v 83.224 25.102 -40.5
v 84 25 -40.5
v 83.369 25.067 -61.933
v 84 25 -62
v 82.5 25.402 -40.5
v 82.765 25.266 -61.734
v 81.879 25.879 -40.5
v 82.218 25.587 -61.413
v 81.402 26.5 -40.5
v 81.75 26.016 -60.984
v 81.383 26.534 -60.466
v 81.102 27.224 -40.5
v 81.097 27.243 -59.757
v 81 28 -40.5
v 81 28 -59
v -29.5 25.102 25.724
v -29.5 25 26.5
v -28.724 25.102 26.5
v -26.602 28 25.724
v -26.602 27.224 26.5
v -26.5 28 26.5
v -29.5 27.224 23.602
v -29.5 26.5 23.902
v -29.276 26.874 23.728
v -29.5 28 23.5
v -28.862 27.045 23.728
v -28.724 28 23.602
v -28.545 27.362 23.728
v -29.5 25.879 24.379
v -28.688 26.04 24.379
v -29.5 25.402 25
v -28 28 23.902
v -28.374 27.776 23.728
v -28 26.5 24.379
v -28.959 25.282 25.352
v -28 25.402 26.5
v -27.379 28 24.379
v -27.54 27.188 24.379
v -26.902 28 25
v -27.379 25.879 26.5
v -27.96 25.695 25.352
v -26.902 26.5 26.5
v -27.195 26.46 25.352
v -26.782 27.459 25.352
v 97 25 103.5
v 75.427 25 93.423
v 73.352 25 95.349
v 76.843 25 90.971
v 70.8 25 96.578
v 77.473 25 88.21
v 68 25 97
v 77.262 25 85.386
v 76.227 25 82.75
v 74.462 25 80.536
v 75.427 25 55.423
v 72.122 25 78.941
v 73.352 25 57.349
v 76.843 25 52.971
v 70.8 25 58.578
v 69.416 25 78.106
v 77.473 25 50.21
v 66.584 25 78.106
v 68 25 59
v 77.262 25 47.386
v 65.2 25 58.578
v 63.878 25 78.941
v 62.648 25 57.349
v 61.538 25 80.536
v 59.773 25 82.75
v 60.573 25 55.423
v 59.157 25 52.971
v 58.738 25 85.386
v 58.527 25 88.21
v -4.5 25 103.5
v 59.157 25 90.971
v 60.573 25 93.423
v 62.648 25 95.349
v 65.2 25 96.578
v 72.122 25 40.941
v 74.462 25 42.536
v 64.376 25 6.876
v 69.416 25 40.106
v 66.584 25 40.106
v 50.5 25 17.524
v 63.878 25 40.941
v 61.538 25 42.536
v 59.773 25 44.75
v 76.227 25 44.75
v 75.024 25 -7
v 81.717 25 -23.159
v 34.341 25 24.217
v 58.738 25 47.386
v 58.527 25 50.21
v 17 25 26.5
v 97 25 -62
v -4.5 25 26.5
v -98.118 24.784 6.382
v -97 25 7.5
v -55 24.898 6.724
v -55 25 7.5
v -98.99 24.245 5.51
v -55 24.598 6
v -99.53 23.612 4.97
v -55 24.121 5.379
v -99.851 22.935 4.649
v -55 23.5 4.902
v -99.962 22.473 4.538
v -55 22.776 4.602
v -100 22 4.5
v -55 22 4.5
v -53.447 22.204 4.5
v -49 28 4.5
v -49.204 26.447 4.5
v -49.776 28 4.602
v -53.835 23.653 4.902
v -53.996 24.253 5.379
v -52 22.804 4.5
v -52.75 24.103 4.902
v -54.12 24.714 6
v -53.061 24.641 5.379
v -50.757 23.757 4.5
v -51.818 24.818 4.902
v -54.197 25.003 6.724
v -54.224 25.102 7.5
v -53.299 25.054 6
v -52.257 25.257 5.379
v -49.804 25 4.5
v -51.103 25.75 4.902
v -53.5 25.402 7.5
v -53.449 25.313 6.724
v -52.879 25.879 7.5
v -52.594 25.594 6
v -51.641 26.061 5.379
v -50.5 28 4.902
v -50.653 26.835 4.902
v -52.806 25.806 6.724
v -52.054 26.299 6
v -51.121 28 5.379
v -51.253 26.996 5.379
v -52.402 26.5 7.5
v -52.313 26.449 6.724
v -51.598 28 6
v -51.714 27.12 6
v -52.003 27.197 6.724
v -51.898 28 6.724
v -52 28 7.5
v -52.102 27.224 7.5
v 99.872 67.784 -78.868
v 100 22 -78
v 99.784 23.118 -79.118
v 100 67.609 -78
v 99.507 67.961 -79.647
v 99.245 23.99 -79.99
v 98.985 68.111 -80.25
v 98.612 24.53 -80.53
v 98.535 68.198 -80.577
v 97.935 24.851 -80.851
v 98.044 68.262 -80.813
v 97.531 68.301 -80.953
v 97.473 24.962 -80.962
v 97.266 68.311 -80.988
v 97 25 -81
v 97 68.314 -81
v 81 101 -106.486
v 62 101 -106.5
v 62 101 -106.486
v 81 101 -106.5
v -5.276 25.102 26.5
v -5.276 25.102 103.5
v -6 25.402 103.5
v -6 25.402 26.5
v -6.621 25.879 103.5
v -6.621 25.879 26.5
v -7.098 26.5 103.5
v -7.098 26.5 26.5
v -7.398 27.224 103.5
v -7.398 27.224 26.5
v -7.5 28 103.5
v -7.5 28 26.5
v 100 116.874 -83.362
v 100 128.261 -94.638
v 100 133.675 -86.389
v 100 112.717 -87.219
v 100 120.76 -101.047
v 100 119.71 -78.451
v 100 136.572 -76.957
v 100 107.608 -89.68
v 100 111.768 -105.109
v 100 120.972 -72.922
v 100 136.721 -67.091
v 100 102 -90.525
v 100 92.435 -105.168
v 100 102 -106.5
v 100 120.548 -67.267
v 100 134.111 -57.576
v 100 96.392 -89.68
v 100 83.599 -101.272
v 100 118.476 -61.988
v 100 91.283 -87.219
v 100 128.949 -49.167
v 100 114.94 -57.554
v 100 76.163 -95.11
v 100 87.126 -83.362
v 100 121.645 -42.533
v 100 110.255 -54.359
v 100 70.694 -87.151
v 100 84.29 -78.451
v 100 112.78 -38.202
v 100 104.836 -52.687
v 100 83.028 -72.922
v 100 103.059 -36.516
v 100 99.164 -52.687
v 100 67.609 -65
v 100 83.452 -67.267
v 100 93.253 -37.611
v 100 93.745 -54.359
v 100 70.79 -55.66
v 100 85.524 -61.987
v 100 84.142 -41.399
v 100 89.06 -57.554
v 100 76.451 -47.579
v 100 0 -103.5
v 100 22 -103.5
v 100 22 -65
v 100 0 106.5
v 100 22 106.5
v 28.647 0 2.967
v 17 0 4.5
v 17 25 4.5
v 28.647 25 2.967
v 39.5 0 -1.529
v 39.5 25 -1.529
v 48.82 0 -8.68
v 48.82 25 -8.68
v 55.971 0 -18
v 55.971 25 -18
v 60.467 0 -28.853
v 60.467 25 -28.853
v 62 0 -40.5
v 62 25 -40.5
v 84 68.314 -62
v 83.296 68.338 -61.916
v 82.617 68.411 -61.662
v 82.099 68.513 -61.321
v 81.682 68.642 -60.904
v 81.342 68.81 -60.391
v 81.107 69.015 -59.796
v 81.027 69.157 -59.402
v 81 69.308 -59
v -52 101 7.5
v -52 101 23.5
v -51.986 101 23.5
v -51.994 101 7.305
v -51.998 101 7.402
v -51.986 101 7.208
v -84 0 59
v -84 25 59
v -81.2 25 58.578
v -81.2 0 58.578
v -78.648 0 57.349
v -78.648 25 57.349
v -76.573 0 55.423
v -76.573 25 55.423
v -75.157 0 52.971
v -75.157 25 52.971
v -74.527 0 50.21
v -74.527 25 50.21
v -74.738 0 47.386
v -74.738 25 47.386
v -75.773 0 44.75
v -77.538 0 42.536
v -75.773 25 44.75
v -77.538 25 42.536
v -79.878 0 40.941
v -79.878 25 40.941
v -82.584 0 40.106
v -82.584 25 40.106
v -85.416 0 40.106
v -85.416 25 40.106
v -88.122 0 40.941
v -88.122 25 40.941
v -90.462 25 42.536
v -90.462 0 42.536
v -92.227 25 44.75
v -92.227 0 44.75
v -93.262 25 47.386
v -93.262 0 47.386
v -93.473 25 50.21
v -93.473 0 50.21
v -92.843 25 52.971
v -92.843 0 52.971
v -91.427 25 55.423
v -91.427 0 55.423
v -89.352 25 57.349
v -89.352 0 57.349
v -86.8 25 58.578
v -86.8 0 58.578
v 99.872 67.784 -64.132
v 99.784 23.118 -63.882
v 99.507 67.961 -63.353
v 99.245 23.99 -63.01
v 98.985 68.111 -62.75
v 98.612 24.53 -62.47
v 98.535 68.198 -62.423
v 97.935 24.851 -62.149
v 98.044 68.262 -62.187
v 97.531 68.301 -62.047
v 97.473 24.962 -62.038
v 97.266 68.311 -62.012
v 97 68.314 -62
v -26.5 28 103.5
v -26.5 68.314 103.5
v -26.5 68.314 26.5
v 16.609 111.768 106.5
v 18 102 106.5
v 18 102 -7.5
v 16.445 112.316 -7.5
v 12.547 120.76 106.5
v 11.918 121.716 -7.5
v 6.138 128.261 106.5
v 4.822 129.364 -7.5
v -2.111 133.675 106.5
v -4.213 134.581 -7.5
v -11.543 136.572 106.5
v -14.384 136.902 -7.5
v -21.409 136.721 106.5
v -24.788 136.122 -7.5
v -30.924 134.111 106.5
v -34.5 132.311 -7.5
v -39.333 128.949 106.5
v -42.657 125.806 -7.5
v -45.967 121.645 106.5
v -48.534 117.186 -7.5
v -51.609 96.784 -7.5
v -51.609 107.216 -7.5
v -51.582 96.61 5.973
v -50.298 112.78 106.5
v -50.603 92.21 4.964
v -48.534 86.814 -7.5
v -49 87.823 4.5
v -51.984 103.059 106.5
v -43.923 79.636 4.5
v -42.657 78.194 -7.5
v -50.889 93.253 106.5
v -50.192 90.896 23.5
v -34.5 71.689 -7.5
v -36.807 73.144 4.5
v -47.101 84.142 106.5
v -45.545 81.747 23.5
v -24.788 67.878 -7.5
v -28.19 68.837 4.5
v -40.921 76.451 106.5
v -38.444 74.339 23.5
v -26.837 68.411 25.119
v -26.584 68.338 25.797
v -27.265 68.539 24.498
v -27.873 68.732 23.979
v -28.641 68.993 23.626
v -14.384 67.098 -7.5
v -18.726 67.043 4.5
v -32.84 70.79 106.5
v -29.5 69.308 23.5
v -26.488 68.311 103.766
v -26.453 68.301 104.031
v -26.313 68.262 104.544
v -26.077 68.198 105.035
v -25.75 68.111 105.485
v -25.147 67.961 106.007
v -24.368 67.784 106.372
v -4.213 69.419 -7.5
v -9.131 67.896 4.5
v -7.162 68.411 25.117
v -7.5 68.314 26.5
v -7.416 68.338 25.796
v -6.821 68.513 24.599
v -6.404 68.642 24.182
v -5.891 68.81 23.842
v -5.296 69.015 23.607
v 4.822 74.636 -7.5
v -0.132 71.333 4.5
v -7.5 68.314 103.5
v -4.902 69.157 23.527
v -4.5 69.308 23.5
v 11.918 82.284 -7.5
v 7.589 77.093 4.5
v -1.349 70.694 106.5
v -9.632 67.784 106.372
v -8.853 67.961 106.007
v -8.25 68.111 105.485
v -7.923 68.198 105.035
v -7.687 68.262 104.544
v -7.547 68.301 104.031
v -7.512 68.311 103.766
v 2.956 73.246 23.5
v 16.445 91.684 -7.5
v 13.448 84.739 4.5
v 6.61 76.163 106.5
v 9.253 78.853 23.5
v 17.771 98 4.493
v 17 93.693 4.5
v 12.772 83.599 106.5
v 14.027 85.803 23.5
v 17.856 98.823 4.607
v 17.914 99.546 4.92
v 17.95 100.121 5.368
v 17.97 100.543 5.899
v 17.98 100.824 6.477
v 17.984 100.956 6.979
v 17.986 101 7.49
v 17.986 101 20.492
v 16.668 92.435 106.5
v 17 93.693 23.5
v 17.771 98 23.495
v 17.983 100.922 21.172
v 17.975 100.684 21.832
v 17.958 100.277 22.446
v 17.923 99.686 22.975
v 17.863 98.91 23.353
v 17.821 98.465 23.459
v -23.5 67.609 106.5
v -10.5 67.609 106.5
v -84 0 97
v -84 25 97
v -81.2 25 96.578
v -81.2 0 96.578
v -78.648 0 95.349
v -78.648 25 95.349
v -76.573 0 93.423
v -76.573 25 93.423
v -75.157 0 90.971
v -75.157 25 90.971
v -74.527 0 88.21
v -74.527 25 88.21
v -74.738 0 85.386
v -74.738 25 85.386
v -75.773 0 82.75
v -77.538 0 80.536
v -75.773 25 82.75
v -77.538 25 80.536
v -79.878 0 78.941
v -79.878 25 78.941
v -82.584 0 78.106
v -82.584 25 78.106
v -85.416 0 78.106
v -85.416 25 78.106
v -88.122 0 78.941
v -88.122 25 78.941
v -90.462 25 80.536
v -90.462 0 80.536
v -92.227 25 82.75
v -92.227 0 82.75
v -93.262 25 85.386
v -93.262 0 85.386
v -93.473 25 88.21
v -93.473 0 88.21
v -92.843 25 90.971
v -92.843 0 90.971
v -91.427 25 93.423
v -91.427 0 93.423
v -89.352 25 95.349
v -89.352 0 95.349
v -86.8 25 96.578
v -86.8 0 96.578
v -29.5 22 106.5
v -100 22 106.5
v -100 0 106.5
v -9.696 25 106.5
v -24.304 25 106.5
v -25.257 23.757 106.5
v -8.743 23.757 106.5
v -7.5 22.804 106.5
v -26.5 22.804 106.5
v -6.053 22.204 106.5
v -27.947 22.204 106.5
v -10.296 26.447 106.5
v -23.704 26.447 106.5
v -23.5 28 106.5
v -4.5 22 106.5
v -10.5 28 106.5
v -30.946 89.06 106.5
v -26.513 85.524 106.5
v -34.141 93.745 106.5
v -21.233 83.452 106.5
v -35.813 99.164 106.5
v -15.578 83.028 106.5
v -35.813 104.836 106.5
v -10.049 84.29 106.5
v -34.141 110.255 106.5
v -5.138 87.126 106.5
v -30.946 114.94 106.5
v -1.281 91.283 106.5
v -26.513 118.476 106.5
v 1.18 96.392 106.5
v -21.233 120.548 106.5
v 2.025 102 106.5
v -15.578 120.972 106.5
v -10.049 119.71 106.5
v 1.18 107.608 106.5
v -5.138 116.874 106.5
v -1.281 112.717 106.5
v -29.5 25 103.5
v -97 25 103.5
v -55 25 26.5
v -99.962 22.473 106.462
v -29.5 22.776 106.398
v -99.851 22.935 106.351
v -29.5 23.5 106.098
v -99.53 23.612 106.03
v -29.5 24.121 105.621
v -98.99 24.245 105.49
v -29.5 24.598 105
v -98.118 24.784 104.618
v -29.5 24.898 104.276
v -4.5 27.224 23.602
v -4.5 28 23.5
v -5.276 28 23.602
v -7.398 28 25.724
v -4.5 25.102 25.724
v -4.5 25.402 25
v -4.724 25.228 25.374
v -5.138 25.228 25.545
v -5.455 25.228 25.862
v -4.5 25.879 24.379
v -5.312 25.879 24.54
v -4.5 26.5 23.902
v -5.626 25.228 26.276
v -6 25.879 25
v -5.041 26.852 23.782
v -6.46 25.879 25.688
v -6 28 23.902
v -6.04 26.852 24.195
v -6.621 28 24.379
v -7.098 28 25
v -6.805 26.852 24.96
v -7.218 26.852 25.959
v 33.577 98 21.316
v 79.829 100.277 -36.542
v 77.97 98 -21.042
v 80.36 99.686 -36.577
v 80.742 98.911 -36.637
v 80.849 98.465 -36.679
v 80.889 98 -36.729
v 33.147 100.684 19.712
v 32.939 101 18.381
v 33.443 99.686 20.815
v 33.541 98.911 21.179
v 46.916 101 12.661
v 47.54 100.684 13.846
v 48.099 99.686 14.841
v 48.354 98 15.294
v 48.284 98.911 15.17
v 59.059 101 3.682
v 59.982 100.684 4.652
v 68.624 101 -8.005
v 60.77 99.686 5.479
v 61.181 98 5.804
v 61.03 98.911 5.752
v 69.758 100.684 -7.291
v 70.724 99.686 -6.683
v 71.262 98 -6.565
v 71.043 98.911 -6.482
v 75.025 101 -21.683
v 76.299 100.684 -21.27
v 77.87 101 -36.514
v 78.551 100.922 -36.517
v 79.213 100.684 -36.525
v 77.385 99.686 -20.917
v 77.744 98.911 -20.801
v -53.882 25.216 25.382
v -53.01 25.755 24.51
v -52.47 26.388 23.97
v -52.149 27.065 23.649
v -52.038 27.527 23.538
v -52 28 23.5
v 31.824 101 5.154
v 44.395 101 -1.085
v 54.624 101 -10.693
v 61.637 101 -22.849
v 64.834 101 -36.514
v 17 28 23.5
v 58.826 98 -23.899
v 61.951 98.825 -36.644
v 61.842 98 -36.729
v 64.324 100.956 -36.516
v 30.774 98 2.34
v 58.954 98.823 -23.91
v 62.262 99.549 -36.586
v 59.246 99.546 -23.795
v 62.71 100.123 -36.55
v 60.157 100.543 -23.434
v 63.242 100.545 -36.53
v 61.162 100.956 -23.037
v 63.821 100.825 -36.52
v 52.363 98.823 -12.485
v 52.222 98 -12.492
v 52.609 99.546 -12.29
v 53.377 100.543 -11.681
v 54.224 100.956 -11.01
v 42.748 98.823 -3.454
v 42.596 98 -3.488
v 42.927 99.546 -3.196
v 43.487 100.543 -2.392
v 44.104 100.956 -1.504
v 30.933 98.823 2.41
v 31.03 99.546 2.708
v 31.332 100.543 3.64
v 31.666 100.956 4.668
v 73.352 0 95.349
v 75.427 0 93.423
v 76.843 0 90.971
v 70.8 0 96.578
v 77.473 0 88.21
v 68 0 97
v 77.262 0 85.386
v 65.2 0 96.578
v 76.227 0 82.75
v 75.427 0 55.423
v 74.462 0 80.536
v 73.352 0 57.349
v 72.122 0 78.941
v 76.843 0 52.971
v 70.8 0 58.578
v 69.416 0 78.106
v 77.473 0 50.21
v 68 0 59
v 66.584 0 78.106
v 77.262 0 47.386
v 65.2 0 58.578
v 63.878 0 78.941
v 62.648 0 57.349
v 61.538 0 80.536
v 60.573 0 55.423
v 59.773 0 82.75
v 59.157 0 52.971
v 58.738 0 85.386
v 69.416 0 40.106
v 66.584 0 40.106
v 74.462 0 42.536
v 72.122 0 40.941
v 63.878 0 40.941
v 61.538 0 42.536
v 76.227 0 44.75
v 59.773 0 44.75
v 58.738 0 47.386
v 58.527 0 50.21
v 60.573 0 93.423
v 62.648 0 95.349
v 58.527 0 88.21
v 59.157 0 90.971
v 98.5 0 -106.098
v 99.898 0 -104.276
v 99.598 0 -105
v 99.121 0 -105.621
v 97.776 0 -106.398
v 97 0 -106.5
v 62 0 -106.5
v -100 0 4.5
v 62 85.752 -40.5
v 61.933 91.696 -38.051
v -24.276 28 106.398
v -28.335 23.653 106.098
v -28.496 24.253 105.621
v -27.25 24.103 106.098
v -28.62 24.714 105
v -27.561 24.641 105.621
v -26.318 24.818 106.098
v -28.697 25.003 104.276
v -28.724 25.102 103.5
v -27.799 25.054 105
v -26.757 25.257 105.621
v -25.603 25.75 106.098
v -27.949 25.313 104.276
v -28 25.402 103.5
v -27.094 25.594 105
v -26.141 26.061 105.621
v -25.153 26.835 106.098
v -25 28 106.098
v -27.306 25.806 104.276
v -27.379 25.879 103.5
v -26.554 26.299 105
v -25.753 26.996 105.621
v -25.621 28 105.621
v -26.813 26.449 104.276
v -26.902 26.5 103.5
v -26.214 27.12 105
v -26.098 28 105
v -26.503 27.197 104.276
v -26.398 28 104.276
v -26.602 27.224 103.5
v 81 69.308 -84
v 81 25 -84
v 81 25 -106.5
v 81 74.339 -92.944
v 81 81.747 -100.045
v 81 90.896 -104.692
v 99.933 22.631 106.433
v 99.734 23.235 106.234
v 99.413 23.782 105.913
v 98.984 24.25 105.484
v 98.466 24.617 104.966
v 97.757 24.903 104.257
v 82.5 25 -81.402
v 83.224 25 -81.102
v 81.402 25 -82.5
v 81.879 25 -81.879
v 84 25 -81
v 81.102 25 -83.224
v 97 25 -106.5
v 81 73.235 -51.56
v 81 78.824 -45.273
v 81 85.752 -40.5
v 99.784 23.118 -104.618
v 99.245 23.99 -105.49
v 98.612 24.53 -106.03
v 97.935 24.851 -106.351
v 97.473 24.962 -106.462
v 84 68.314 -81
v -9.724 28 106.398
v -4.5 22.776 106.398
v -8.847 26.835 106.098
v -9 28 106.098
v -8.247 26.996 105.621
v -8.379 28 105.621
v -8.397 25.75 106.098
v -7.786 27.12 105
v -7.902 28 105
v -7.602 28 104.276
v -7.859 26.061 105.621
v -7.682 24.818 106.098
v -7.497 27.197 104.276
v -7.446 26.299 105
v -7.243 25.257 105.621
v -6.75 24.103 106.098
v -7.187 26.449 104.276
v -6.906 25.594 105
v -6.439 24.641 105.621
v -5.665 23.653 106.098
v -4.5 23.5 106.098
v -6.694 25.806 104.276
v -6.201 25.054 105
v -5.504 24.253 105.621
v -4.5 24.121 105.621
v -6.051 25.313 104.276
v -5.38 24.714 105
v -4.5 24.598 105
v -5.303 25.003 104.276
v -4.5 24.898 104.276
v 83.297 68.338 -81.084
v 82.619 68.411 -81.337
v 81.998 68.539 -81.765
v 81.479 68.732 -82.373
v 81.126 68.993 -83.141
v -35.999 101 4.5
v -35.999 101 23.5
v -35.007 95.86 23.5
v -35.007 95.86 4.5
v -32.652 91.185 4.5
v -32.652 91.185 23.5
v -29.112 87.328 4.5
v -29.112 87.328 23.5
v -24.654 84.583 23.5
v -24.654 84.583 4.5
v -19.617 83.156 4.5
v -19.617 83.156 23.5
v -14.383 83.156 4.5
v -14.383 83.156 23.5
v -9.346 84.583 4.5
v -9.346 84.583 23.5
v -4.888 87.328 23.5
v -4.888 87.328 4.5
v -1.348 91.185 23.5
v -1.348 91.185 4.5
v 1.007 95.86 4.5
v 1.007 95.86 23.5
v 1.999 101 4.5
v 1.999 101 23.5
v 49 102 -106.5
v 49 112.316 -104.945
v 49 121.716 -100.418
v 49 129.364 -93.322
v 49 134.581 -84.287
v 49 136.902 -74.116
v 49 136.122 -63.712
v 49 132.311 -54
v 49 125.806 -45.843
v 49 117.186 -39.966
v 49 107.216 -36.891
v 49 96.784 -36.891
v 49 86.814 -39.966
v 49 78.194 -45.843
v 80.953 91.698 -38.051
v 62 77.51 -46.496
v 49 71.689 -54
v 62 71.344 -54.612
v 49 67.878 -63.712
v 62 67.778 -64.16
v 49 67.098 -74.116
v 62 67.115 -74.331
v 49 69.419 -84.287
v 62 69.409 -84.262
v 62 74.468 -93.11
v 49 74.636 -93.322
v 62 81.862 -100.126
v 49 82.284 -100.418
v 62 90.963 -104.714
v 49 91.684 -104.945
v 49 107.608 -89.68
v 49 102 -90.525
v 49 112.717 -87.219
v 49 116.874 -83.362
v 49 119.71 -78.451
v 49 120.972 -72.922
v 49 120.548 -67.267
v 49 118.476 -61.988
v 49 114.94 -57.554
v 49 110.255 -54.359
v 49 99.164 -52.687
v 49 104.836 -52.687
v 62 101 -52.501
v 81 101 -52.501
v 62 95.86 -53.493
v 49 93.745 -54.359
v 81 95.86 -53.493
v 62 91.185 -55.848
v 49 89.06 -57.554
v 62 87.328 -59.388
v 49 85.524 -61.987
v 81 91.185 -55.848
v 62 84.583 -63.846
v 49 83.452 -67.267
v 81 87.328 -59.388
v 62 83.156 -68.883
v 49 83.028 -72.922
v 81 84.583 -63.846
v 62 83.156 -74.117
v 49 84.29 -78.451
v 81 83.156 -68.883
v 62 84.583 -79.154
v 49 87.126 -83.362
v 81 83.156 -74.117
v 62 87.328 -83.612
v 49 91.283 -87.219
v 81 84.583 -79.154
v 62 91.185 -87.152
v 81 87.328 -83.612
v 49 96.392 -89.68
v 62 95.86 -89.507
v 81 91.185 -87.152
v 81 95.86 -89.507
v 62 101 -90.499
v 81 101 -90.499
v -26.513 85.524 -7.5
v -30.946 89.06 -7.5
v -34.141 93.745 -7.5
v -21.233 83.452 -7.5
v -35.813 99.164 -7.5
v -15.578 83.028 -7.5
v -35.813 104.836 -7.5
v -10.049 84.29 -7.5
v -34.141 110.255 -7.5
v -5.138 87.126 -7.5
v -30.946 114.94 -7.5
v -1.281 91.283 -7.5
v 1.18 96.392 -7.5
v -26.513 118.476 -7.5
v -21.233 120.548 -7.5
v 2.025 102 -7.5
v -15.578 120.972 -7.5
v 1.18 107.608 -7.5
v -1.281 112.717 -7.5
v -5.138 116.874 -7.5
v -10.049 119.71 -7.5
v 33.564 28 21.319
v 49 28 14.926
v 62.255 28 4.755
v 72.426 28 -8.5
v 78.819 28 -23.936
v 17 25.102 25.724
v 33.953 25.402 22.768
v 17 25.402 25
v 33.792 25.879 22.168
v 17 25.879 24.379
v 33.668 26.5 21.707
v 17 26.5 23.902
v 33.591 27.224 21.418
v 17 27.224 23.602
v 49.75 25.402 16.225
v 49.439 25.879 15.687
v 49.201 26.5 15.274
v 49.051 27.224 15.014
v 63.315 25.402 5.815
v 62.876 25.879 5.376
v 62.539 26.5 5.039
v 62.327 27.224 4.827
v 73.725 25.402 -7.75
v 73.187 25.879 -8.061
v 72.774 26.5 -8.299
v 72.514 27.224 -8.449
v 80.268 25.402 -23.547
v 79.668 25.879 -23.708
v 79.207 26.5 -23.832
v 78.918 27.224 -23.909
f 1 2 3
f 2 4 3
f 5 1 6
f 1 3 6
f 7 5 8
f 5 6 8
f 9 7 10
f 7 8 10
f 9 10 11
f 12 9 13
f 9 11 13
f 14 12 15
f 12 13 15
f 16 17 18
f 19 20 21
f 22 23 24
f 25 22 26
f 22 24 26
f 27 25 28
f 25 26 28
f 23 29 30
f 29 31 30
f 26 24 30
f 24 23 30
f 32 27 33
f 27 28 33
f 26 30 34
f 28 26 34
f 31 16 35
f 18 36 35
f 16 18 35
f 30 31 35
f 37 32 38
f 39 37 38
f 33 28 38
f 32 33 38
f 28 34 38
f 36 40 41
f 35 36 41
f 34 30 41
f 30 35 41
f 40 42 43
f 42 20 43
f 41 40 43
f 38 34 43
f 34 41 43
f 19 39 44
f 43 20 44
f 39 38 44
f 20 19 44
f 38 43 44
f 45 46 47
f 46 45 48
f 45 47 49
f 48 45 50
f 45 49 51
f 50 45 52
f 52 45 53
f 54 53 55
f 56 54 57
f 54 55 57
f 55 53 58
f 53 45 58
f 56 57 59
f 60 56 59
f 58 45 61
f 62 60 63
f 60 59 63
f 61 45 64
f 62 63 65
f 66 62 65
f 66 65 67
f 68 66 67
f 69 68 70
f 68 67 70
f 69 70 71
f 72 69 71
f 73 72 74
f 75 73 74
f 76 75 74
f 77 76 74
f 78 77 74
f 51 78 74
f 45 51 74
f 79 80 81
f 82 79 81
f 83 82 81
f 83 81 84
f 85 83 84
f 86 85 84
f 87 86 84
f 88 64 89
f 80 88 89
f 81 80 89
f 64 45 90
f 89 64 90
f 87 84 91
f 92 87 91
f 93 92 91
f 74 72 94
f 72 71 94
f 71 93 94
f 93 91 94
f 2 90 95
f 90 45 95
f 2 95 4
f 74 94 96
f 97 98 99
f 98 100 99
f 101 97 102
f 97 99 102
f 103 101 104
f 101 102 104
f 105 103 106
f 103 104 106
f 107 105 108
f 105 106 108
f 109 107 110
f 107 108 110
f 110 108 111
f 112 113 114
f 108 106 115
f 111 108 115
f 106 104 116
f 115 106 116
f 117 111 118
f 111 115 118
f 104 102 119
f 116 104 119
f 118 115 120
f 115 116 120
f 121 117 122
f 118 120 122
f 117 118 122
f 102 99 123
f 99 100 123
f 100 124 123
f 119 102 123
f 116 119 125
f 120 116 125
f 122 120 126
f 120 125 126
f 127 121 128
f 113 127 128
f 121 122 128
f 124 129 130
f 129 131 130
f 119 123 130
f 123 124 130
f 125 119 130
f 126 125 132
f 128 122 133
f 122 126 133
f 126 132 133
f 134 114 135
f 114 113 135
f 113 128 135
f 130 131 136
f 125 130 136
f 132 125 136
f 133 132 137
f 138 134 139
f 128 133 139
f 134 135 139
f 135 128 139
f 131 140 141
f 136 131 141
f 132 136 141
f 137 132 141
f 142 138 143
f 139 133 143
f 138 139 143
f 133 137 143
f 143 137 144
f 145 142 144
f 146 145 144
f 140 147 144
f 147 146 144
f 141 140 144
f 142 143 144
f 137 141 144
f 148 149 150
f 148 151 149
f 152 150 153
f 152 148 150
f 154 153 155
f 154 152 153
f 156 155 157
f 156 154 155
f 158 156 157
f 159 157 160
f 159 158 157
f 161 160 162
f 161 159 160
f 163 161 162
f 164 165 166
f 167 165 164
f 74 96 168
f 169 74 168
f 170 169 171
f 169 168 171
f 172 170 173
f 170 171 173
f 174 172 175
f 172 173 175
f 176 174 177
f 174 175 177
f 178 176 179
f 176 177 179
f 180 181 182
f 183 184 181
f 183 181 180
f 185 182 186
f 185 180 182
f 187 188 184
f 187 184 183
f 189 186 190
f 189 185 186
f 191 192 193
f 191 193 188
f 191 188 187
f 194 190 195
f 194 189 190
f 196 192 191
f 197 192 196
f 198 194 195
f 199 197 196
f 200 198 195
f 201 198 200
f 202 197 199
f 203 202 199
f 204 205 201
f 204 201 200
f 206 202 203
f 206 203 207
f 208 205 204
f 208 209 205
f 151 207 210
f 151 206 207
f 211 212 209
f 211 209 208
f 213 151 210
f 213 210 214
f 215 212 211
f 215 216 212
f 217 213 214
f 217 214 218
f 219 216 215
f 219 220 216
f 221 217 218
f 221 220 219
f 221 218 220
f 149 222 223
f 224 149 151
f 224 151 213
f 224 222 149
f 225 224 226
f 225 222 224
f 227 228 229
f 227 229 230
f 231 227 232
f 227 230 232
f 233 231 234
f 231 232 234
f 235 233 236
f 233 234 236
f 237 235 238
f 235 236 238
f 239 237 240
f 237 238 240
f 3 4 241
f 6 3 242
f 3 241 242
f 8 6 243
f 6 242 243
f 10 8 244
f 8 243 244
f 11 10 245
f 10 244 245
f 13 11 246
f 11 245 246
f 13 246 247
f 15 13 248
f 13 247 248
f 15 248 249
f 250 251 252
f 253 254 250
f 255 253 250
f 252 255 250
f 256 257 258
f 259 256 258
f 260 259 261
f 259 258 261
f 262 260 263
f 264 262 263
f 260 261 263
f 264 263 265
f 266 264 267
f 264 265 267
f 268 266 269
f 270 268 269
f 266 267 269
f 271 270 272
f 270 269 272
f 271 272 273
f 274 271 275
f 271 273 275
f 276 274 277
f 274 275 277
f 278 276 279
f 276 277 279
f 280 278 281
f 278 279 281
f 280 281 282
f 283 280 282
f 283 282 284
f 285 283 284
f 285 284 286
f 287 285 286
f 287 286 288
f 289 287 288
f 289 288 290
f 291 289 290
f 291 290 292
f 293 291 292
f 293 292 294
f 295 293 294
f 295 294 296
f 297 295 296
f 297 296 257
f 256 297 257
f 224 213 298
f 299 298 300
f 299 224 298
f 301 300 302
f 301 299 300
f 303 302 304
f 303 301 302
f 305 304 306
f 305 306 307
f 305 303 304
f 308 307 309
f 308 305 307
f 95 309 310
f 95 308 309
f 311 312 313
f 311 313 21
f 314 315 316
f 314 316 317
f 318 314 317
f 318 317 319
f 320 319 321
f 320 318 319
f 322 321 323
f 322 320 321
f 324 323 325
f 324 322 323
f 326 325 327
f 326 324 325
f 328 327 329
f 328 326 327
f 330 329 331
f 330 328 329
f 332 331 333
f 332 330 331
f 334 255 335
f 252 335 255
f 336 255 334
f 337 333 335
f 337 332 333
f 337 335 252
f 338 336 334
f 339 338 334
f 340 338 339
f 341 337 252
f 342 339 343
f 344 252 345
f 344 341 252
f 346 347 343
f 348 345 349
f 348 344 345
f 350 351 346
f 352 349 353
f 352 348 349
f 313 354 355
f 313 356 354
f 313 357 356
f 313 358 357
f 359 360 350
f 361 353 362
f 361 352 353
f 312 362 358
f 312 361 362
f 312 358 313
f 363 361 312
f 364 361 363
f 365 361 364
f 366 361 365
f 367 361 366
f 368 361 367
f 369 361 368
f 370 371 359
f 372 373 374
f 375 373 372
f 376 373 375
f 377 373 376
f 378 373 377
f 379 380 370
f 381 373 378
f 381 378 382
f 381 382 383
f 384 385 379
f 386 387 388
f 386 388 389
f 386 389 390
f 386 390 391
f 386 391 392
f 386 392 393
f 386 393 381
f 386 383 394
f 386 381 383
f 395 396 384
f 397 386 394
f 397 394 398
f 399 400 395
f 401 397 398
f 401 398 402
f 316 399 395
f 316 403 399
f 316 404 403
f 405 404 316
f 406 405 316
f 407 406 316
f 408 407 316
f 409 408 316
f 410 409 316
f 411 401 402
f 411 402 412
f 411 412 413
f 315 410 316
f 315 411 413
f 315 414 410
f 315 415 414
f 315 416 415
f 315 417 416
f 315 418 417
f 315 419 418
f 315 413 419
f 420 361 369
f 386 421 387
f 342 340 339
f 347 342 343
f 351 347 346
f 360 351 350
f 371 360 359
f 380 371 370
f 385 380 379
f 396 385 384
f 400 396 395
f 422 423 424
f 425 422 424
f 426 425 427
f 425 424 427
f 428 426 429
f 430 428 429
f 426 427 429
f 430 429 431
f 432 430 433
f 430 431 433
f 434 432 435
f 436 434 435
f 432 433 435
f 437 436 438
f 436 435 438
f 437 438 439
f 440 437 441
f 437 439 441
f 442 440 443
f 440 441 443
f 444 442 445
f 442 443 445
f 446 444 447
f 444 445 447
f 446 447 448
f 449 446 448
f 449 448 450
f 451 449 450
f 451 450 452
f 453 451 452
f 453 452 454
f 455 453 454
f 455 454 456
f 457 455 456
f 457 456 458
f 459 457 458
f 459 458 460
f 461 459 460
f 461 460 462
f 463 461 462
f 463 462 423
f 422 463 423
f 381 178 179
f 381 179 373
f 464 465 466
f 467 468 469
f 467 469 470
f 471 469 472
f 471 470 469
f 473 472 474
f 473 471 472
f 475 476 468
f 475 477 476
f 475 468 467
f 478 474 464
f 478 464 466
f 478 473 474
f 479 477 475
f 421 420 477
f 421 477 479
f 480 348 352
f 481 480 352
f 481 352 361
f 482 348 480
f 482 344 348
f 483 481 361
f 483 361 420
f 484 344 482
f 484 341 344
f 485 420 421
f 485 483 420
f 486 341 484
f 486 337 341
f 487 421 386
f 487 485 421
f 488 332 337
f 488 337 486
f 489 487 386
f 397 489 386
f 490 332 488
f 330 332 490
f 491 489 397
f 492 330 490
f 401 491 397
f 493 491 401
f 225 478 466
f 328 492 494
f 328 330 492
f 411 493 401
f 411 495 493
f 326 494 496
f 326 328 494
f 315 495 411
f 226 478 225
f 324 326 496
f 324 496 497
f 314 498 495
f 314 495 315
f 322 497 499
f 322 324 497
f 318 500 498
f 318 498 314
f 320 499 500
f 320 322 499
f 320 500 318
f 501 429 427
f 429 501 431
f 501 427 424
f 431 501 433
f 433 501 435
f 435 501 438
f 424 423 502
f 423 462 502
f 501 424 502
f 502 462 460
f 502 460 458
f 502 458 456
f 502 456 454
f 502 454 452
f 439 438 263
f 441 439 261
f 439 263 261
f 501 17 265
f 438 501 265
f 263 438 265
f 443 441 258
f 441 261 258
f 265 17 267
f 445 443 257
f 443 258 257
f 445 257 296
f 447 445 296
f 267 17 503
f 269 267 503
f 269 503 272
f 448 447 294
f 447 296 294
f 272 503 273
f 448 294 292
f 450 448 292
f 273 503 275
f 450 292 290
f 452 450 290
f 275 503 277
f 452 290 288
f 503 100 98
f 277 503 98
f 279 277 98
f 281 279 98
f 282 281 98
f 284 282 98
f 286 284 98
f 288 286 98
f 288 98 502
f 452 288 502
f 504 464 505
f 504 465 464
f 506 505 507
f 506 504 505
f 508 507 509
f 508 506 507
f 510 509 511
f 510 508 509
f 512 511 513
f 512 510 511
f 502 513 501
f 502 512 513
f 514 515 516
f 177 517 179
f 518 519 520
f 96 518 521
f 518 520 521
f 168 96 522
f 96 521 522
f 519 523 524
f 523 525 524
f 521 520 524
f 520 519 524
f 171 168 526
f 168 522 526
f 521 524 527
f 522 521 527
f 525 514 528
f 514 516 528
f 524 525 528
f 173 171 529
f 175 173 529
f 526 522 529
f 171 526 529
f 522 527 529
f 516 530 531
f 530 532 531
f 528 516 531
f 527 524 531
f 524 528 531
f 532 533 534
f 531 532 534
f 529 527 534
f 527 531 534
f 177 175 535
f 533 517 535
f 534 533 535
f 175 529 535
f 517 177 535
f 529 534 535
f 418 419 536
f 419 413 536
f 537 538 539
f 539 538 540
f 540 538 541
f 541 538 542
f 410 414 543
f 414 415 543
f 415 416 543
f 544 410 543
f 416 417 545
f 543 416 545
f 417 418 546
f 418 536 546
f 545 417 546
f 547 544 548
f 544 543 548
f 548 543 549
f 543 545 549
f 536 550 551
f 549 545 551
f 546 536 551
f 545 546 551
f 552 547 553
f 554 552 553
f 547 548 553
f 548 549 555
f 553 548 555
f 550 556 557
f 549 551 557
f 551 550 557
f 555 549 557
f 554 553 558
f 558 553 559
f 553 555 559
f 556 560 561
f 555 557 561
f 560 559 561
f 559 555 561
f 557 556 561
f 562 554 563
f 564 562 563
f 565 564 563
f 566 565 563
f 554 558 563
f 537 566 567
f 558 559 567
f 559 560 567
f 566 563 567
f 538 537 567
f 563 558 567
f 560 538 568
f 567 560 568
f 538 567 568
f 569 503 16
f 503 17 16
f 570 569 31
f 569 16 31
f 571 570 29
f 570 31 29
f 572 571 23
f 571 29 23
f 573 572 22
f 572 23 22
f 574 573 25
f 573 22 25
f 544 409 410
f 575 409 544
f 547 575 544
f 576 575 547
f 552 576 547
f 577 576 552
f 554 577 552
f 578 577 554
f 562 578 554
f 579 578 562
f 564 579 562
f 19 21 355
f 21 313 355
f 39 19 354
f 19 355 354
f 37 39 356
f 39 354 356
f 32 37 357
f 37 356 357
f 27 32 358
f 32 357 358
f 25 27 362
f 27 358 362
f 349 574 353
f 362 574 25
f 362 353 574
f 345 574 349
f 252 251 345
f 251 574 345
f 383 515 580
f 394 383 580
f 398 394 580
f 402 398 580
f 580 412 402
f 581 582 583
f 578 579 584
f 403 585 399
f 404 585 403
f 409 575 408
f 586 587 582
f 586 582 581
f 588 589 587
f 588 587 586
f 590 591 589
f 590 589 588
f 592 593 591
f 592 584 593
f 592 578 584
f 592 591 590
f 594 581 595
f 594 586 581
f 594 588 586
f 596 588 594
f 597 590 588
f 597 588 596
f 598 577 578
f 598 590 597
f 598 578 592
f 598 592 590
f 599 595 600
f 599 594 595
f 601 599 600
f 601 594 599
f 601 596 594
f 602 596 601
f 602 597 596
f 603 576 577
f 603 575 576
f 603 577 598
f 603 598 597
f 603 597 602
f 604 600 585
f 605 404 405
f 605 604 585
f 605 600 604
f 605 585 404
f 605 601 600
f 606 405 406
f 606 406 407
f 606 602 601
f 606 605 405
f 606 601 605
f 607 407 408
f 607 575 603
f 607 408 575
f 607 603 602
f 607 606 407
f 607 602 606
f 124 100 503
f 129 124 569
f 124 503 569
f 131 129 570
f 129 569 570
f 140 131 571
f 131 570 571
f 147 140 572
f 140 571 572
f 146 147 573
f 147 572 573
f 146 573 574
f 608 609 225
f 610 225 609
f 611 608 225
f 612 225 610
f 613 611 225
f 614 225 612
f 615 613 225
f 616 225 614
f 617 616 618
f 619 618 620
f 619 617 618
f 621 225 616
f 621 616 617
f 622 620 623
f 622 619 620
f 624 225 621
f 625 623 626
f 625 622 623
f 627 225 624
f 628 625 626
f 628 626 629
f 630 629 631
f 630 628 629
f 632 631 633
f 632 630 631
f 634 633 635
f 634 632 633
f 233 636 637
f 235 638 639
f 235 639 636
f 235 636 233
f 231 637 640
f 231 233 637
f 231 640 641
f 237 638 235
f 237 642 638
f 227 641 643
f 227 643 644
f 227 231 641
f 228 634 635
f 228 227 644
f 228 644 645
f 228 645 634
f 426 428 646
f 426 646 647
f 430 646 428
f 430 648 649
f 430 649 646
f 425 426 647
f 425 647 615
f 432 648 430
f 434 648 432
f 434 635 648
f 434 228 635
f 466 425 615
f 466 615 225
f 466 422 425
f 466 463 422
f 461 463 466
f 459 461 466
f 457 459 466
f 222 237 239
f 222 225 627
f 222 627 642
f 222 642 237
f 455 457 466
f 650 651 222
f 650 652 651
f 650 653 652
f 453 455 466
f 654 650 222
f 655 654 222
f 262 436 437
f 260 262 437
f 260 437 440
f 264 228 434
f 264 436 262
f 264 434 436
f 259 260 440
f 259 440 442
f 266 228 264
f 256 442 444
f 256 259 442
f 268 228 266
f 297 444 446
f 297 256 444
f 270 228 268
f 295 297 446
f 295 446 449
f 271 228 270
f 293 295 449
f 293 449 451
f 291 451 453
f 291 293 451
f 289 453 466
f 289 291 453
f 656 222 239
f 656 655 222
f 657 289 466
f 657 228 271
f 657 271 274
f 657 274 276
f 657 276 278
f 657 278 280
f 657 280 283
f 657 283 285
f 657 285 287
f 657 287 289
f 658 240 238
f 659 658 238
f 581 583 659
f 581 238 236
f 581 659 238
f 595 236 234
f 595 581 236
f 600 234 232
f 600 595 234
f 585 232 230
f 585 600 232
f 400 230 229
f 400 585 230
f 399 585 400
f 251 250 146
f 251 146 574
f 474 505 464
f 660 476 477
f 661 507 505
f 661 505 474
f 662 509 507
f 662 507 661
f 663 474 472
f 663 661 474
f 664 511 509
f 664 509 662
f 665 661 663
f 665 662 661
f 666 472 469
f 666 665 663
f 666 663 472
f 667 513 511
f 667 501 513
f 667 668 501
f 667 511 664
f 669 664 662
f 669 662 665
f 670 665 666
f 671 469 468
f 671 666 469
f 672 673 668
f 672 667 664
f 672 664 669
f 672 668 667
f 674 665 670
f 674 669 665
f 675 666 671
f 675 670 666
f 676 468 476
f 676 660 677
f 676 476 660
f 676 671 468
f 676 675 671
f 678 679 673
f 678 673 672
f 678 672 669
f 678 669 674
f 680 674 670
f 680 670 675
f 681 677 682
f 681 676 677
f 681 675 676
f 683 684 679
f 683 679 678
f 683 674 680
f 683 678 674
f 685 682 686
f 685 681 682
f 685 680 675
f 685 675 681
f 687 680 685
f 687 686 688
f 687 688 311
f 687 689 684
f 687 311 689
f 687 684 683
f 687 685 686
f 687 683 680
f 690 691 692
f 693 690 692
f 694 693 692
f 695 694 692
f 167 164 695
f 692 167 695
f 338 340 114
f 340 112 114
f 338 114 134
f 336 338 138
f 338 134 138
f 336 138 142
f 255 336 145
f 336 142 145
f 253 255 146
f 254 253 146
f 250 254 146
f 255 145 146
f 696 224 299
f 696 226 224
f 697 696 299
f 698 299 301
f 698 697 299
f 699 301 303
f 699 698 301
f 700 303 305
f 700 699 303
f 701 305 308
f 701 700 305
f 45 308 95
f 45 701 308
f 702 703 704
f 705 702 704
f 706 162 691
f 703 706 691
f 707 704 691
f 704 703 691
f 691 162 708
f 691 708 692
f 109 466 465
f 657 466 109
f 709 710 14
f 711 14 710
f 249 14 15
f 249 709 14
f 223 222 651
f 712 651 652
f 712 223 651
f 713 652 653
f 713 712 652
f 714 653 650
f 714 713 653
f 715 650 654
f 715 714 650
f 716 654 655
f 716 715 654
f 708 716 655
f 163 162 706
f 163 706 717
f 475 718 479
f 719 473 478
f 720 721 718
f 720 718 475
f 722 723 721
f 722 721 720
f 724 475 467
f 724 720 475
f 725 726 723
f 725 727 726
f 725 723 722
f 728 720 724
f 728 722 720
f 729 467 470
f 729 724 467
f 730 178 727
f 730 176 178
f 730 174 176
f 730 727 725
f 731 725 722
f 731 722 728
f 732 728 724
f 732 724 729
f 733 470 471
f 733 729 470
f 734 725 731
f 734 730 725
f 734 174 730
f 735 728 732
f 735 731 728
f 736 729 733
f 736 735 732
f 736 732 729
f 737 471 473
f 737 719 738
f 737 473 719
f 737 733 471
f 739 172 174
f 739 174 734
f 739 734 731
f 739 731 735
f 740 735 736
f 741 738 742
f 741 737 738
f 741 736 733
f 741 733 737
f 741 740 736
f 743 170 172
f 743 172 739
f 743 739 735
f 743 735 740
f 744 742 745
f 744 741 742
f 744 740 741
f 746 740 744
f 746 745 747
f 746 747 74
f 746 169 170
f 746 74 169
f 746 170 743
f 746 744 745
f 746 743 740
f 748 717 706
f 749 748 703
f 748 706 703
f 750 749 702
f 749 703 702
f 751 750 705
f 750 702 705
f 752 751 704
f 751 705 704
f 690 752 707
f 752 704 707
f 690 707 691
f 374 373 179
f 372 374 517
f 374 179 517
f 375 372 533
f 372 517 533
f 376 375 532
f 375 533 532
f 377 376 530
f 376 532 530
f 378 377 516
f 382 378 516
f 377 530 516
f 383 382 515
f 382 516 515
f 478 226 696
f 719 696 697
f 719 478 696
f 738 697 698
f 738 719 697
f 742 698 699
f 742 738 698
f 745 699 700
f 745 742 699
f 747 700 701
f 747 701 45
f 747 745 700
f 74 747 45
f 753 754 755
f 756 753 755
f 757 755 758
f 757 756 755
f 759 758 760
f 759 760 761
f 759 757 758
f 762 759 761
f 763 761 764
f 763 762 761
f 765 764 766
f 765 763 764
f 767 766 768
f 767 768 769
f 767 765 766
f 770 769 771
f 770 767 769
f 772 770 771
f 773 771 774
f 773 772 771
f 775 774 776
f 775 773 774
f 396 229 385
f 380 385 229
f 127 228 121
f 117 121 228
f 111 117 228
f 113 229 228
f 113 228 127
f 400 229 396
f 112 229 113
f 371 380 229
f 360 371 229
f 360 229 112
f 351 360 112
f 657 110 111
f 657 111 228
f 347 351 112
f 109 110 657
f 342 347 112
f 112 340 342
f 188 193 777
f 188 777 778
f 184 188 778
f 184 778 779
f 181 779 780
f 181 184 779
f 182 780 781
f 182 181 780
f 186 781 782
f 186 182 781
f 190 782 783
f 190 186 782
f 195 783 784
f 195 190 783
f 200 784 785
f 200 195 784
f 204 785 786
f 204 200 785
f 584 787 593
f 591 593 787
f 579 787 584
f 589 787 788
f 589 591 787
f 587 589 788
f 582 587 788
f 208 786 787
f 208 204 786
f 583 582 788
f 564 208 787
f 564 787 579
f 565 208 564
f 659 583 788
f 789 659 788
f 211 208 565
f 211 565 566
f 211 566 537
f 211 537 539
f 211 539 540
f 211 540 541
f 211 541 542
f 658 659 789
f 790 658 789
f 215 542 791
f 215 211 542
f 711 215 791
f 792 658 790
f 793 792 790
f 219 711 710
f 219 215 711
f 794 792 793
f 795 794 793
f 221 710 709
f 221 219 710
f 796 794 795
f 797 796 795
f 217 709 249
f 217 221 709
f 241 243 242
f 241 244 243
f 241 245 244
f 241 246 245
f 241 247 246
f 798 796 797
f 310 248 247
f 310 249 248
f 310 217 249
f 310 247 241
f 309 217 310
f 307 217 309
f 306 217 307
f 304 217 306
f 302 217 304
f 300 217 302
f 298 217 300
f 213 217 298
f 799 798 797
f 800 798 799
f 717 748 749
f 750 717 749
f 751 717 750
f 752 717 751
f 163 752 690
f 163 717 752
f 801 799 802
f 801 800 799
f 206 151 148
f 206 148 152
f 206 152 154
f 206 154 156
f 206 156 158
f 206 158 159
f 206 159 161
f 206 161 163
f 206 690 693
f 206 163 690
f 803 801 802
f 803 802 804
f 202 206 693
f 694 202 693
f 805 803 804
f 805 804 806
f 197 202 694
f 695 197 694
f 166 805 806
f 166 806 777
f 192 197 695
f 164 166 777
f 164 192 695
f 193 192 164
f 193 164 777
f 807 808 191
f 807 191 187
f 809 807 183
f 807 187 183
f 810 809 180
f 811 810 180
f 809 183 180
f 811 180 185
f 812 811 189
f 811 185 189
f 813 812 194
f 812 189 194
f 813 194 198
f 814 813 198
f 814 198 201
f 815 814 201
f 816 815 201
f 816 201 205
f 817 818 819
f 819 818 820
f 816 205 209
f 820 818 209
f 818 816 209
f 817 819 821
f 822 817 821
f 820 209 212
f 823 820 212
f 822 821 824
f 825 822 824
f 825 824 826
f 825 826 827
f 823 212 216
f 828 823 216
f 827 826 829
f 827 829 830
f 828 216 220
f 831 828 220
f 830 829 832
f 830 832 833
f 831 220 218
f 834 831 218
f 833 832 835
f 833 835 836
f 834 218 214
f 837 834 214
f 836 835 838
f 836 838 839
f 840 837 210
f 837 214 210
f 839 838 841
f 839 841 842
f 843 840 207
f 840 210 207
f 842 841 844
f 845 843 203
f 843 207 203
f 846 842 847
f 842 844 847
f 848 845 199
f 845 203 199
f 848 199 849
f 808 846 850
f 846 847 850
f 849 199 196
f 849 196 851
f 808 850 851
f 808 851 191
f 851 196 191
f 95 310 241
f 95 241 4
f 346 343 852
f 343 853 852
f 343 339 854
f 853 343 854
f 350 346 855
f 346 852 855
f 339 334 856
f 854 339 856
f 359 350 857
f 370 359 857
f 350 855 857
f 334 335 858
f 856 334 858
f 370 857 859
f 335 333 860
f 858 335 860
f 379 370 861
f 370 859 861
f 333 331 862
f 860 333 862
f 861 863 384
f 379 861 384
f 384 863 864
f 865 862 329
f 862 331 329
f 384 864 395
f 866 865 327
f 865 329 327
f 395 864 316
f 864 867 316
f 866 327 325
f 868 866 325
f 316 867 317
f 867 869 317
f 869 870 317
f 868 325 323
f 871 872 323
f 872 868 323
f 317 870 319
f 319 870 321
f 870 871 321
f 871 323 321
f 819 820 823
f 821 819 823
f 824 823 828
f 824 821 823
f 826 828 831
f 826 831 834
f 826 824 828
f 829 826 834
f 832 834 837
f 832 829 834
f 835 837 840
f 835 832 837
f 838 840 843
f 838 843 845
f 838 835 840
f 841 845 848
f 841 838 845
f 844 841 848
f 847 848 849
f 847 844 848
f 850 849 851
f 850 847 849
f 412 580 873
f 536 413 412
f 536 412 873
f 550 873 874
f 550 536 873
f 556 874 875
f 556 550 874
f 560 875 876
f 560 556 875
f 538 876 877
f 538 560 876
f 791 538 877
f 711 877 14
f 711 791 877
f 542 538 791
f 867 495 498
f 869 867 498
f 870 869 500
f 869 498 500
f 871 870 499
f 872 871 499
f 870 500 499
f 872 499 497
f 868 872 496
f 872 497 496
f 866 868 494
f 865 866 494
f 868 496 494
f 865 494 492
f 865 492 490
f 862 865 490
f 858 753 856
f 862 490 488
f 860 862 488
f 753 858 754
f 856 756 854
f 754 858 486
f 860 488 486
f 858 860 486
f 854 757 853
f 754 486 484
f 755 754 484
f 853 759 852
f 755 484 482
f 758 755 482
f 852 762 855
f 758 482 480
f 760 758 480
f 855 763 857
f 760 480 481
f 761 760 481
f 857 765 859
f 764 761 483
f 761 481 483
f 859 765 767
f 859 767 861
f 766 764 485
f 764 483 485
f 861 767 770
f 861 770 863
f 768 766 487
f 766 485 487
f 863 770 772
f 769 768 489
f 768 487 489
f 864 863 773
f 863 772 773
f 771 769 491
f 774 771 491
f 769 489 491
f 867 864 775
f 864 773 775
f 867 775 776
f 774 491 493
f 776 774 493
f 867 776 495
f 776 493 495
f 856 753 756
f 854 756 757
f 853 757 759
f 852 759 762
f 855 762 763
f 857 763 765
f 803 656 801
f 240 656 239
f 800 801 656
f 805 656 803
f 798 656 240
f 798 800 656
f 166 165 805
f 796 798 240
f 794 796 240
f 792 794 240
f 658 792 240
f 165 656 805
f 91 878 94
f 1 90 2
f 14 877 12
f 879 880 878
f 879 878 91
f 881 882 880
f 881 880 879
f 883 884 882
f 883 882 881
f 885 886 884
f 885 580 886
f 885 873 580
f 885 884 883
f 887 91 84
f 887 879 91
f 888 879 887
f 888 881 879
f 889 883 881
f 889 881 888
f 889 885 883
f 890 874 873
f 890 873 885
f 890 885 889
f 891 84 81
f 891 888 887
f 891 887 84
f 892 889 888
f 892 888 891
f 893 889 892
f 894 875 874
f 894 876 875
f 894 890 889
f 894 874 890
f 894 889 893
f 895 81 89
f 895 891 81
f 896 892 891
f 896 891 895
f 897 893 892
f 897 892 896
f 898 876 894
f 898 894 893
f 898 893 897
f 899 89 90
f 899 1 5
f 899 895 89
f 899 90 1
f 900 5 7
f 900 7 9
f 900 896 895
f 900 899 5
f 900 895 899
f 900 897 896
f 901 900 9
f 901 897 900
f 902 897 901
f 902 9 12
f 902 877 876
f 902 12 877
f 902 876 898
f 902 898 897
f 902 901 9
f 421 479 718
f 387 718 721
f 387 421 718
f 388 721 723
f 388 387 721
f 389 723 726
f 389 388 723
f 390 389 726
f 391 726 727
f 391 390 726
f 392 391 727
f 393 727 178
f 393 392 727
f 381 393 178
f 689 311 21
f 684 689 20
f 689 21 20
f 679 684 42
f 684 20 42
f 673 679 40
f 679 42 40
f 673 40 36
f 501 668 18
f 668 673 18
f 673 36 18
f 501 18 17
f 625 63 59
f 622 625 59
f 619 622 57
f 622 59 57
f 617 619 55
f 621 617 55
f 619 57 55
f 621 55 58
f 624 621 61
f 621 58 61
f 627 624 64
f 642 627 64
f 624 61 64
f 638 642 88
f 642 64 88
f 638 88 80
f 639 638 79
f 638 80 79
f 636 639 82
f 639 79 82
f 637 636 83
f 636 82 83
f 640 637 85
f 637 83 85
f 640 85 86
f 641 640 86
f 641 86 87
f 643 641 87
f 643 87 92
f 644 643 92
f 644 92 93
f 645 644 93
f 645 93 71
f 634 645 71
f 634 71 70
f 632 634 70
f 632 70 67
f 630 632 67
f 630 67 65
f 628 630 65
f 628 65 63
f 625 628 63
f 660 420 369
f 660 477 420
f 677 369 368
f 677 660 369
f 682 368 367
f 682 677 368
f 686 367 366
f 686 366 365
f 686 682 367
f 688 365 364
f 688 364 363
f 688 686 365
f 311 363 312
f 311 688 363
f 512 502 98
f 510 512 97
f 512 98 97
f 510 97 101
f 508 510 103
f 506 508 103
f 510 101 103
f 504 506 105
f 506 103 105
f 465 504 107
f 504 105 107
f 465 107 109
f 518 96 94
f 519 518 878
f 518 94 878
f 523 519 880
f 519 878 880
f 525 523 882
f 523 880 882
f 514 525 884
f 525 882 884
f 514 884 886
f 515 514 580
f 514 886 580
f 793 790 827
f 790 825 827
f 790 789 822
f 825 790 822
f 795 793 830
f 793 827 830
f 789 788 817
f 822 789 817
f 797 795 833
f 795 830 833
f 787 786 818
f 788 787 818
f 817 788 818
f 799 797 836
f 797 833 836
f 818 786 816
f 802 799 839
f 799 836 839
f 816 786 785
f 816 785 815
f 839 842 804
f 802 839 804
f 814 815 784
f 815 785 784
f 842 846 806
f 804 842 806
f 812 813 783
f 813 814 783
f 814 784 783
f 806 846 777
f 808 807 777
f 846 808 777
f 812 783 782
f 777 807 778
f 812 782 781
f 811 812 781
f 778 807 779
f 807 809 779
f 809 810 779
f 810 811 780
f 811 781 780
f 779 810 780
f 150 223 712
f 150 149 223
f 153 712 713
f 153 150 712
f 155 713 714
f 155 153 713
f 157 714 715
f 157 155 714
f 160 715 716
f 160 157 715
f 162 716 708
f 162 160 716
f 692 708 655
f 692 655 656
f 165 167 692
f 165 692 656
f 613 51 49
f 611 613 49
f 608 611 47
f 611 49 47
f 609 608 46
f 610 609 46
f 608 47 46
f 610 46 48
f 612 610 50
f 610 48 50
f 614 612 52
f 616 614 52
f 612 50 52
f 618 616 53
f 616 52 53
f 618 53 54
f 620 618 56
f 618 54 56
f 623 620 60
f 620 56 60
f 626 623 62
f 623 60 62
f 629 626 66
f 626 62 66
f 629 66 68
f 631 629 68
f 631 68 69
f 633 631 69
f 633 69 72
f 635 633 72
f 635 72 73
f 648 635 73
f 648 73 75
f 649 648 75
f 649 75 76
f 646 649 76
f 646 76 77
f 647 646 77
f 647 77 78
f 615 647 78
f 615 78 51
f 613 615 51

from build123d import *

# Parameters (mm, degrees)
BOSS_EXTRUDE2_DEPTH = 25
FILLET1_R           = 45
SKETCH7_R           = 35
SKETCH7_R_2         = 19.025
BOSS_EXTRUDE3_DEPTH = 114
SKETCH8_R           = 35
SKETCH8_R_2         = 19.025
BOSS_EXTRUDE4_DEPTH = 51
BOSS_EXTRUDE5_START = 76
BOSS_EXTRUDE5_DEPTH = 76
SKETCH8_2_R         = 19.025
CUT_EXTRUDE1_DEPTH  = 265.785290469
SKETCH7_2_R         = 19.025
CUT_EXTRUDE2_DEPTH  = 273.282941239
BOSS_EXTRUDE6_REACH = 274.283
BOSS_EXTRUDE7_REACH = 266.785
SKETCH12_R          = 9.5
CUT_EXTRUDE3_DEPTH  = 185.082182907
FILLET2_R           = 3


with BuildPart() as part:
    # Sketch2 → Boss-Extrude2 (new body)
    with BuildSketch(Plane(origin=(0, 0, 0), x_dir=(1, 0, 0), z_dir=(0, 1, 0))):
        Polygon((-100, -106.5), (-100, -4.5), (62, -4.5), (62, 106.5), (100, 106.5), (100, -106.5), align=None)
    extrude(amount=BOSS_EXTRUDE2_DEPTH)

    # Fillet1
    fillet1_edges = [part.edges().sort_by_distance(p)[0] for p in [
        (62, 12.5, 4.5),
    ]]
    fillet(fillet1_edges, radius=FILLET1_R)



with BuildPart() as body_2:
    # Sketch7 → Boss-Extrude3 (new body)
    with BuildSketch(Plane.XY.offset(106.5)):
        with Locations((-17, 102)):
            Circle(SKETCH7_R)
        with Locations((-17, 102)):
            Circle(SKETCH7_R_2, mode=Mode.SUBTRACT)
    extrude(amount=-BOSS_EXTRUDE3_DEPTH)


with BuildPart() as body_3:
    # Sketch8 → Boss-Extrude4 (new body)
    with BuildSketch(Plane(origin=(100, 0, 0), x_dir=(0, 0, -1), z_dir=(1, 0, 0))):
        with Locations((71.5, 102)):
            Circle(SKETCH8_R)
        with Locations((71.5, 102)):
            Circle(SKETCH8_R_2, mode=Mode.SUBTRACT)
    extrude(amount=-BOSS_EXTRUDE4_DEPTH)


with BuildPart() as part_1:
    add(part.part)

    add(body_2.part)  # Boss-Extrude5 merges body 2

    add(body_3.part)  # Boss-Extrude5 merges body 3
    # Sketch9 → Boss-Extrude5 (add)
    with BuildSketch(Plane(origin=(0, 25, 0), x_dir=(1, 0, 0), z_dir=(0, 1, 0)).offset(BOSS_EXTRUDE5_START)):
        with BuildLine():
            Line((17, -4.5), (-52, -4.5))
            Line((-52, -4.5), (-52, -23.5))
            Line((-52, -23.5), (17, -23.5))
            ThreePointArc((17, -23.5), (62.254833996, -4.754833996), (81, 40.5))
            Line((81, 40.5), (81, 106.5))
            Line((81, 106.5), (62, 106.5))
            Line((62, 106.5), (62, 40.5))
            ThreePointArc((62, 40.5), (48.819805153, 8.680194847), (17, -4.5))
        make_face()
    extrude(amount=-BOSS_EXTRUDE5_DEPTH)

    # Sketch8<2> → Cut-Extrude1 (cut, through all)
    with BuildSketch(Plane(origin=(100, 0, 0), x_dir=(0, 0, -1), z_dir=(1, 0, 0))):
        with Locations((71.5, 102)):
            Circle(SKETCH8_2_R)
    extrude(amount=-CUT_EXTRUDE1_DEPTH, mode=Mode.SUBTRACT)

    # Sketch7<2> → Cut-Extrude2 (cut, through all)
    with BuildSketch(Plane.XY.offset(106.5)):
        with Locations((-17, 102)):
            Circle(SKETCH7_2_R)
    extrude(amount=-CUT_EXTRUDE2_DEPTH, mode=Mode.SUBTRACT)

    # Sketch10 → Boss-Extrude6 (add, up to next)
    with BuildSketch(Plane.XY.offset(106.5), mode=Mode.PRIVATE) as boss_extrude6_sk1:
        with BuildLine():
            Line((-26.5, 25), (-7.5, 25))
            Line((-7.5, 25), (-7.5, 68.313949475))
            ThreePointArc((-7.5, 68.313949475), (-17, 67), (-26.5, 68.313949475))
            Line((-26.5, 68.313949475), (-26.5, 25))
        make_face()
    boss_extrude6_tool1 = extrude(boss_extrude6_sk1.sketch, amount=-BOSS_EXTRUDE6_REACH, mode=Mode.PRIVATE) - part_1.part
    add(boss_extrude6_tool1.solids().sort_by_distance((-17, 46.219119, 106.5))[0])

    # Sketch11 → Boss-Extrude7 (add, up to next)
    with BuildSketch(Plane(origin=(100, 0, 0), x_dir=(0, 0, -1), z_dir=(1, 0, 0)), mode=Mode.PRIVATE) as boss_extrude7_sk1:
        with BuildLine():
            Line((62, 25), (81, 25))
            Line((81, 25), (81, 68.313949475))
            ThreePointArc((81, 68.313949475), (71.5, 67), (62, 68.313949475))
            Line((62, 68.313949475), (62, 25))
        make_face()
    boss_extrude7_tool1 = extrude(boss_extrude7_sk1.sketch, amount=-BOSS_EXTRUDE7_REACH, mode=Mode.PRIVATE) - part_1.part
    add(boss_extrude7_tool1.solids().sort_by_distance((100, 46.219119, -71.5))[0])

    # Sketch12 → Cut-Extrude3 (cut, through all)
    with BuildSketch(Plane(origin=(0, 25, 0), x_dir=(1, 0, 0), z_dir=(0, 1, 0))):
        with Locations((68, -49.5)):
            Circle(SKETCH12_R)
        with Locations((68, -87.5)):
            Circle(SKETCH12_R)
        with Locations((-84, -49.5)):
            Circle(SKETCH12_R)
        with Locations((-84, -87.5)):
            Circle(SKETCH12_R)
    extrude(amount=-CUT_EXTRUDE3_DEPTH, mode=Mode.SUBTRACT)

    # Fillet2
    fillet2_edges = [part_1.edges().sort_by_distance(p)[0] for p in [
        (-52, 63, 4.5),
        (-7.5, 46.656974737, 106.5),
        (4.75, 25, 23.5),
        (81, 25, -51.25),
        (47.739784514, 101, -7.635647762),
        (-26.5, 25, 65),
        (-52, 25, 14),
        (-39.25, 25, 23.5),
        (-26.5, 46.656974737, 23.5),
        (-76, 25, 4.5),
        (-100, 25, 55.5),
        (-63.25, 25, 106.5),
        (-7.5, 46.656974737, 23.5),
        (81, 46.656974737, -81),
        (81, 46.656974737, -62),
        (100, 12.5, -106.5),
        (100, 25, -93.75),
        (100, 46.656974737, -81),
        (100, 46.656974737, -62),
        (61.180922368, 101, 5.803845399),
        (-26.5, 46.656974737, 106.5),
        (100, 25, 22.25),
        (46.25, 25, 106.5),
        (-7.5, 25, 65),
        (62.254833996, 25, 4.754833996),
    ]]
    fillet(fillet2_edges, radius=FILLET2_R)


solid = part_1.part
